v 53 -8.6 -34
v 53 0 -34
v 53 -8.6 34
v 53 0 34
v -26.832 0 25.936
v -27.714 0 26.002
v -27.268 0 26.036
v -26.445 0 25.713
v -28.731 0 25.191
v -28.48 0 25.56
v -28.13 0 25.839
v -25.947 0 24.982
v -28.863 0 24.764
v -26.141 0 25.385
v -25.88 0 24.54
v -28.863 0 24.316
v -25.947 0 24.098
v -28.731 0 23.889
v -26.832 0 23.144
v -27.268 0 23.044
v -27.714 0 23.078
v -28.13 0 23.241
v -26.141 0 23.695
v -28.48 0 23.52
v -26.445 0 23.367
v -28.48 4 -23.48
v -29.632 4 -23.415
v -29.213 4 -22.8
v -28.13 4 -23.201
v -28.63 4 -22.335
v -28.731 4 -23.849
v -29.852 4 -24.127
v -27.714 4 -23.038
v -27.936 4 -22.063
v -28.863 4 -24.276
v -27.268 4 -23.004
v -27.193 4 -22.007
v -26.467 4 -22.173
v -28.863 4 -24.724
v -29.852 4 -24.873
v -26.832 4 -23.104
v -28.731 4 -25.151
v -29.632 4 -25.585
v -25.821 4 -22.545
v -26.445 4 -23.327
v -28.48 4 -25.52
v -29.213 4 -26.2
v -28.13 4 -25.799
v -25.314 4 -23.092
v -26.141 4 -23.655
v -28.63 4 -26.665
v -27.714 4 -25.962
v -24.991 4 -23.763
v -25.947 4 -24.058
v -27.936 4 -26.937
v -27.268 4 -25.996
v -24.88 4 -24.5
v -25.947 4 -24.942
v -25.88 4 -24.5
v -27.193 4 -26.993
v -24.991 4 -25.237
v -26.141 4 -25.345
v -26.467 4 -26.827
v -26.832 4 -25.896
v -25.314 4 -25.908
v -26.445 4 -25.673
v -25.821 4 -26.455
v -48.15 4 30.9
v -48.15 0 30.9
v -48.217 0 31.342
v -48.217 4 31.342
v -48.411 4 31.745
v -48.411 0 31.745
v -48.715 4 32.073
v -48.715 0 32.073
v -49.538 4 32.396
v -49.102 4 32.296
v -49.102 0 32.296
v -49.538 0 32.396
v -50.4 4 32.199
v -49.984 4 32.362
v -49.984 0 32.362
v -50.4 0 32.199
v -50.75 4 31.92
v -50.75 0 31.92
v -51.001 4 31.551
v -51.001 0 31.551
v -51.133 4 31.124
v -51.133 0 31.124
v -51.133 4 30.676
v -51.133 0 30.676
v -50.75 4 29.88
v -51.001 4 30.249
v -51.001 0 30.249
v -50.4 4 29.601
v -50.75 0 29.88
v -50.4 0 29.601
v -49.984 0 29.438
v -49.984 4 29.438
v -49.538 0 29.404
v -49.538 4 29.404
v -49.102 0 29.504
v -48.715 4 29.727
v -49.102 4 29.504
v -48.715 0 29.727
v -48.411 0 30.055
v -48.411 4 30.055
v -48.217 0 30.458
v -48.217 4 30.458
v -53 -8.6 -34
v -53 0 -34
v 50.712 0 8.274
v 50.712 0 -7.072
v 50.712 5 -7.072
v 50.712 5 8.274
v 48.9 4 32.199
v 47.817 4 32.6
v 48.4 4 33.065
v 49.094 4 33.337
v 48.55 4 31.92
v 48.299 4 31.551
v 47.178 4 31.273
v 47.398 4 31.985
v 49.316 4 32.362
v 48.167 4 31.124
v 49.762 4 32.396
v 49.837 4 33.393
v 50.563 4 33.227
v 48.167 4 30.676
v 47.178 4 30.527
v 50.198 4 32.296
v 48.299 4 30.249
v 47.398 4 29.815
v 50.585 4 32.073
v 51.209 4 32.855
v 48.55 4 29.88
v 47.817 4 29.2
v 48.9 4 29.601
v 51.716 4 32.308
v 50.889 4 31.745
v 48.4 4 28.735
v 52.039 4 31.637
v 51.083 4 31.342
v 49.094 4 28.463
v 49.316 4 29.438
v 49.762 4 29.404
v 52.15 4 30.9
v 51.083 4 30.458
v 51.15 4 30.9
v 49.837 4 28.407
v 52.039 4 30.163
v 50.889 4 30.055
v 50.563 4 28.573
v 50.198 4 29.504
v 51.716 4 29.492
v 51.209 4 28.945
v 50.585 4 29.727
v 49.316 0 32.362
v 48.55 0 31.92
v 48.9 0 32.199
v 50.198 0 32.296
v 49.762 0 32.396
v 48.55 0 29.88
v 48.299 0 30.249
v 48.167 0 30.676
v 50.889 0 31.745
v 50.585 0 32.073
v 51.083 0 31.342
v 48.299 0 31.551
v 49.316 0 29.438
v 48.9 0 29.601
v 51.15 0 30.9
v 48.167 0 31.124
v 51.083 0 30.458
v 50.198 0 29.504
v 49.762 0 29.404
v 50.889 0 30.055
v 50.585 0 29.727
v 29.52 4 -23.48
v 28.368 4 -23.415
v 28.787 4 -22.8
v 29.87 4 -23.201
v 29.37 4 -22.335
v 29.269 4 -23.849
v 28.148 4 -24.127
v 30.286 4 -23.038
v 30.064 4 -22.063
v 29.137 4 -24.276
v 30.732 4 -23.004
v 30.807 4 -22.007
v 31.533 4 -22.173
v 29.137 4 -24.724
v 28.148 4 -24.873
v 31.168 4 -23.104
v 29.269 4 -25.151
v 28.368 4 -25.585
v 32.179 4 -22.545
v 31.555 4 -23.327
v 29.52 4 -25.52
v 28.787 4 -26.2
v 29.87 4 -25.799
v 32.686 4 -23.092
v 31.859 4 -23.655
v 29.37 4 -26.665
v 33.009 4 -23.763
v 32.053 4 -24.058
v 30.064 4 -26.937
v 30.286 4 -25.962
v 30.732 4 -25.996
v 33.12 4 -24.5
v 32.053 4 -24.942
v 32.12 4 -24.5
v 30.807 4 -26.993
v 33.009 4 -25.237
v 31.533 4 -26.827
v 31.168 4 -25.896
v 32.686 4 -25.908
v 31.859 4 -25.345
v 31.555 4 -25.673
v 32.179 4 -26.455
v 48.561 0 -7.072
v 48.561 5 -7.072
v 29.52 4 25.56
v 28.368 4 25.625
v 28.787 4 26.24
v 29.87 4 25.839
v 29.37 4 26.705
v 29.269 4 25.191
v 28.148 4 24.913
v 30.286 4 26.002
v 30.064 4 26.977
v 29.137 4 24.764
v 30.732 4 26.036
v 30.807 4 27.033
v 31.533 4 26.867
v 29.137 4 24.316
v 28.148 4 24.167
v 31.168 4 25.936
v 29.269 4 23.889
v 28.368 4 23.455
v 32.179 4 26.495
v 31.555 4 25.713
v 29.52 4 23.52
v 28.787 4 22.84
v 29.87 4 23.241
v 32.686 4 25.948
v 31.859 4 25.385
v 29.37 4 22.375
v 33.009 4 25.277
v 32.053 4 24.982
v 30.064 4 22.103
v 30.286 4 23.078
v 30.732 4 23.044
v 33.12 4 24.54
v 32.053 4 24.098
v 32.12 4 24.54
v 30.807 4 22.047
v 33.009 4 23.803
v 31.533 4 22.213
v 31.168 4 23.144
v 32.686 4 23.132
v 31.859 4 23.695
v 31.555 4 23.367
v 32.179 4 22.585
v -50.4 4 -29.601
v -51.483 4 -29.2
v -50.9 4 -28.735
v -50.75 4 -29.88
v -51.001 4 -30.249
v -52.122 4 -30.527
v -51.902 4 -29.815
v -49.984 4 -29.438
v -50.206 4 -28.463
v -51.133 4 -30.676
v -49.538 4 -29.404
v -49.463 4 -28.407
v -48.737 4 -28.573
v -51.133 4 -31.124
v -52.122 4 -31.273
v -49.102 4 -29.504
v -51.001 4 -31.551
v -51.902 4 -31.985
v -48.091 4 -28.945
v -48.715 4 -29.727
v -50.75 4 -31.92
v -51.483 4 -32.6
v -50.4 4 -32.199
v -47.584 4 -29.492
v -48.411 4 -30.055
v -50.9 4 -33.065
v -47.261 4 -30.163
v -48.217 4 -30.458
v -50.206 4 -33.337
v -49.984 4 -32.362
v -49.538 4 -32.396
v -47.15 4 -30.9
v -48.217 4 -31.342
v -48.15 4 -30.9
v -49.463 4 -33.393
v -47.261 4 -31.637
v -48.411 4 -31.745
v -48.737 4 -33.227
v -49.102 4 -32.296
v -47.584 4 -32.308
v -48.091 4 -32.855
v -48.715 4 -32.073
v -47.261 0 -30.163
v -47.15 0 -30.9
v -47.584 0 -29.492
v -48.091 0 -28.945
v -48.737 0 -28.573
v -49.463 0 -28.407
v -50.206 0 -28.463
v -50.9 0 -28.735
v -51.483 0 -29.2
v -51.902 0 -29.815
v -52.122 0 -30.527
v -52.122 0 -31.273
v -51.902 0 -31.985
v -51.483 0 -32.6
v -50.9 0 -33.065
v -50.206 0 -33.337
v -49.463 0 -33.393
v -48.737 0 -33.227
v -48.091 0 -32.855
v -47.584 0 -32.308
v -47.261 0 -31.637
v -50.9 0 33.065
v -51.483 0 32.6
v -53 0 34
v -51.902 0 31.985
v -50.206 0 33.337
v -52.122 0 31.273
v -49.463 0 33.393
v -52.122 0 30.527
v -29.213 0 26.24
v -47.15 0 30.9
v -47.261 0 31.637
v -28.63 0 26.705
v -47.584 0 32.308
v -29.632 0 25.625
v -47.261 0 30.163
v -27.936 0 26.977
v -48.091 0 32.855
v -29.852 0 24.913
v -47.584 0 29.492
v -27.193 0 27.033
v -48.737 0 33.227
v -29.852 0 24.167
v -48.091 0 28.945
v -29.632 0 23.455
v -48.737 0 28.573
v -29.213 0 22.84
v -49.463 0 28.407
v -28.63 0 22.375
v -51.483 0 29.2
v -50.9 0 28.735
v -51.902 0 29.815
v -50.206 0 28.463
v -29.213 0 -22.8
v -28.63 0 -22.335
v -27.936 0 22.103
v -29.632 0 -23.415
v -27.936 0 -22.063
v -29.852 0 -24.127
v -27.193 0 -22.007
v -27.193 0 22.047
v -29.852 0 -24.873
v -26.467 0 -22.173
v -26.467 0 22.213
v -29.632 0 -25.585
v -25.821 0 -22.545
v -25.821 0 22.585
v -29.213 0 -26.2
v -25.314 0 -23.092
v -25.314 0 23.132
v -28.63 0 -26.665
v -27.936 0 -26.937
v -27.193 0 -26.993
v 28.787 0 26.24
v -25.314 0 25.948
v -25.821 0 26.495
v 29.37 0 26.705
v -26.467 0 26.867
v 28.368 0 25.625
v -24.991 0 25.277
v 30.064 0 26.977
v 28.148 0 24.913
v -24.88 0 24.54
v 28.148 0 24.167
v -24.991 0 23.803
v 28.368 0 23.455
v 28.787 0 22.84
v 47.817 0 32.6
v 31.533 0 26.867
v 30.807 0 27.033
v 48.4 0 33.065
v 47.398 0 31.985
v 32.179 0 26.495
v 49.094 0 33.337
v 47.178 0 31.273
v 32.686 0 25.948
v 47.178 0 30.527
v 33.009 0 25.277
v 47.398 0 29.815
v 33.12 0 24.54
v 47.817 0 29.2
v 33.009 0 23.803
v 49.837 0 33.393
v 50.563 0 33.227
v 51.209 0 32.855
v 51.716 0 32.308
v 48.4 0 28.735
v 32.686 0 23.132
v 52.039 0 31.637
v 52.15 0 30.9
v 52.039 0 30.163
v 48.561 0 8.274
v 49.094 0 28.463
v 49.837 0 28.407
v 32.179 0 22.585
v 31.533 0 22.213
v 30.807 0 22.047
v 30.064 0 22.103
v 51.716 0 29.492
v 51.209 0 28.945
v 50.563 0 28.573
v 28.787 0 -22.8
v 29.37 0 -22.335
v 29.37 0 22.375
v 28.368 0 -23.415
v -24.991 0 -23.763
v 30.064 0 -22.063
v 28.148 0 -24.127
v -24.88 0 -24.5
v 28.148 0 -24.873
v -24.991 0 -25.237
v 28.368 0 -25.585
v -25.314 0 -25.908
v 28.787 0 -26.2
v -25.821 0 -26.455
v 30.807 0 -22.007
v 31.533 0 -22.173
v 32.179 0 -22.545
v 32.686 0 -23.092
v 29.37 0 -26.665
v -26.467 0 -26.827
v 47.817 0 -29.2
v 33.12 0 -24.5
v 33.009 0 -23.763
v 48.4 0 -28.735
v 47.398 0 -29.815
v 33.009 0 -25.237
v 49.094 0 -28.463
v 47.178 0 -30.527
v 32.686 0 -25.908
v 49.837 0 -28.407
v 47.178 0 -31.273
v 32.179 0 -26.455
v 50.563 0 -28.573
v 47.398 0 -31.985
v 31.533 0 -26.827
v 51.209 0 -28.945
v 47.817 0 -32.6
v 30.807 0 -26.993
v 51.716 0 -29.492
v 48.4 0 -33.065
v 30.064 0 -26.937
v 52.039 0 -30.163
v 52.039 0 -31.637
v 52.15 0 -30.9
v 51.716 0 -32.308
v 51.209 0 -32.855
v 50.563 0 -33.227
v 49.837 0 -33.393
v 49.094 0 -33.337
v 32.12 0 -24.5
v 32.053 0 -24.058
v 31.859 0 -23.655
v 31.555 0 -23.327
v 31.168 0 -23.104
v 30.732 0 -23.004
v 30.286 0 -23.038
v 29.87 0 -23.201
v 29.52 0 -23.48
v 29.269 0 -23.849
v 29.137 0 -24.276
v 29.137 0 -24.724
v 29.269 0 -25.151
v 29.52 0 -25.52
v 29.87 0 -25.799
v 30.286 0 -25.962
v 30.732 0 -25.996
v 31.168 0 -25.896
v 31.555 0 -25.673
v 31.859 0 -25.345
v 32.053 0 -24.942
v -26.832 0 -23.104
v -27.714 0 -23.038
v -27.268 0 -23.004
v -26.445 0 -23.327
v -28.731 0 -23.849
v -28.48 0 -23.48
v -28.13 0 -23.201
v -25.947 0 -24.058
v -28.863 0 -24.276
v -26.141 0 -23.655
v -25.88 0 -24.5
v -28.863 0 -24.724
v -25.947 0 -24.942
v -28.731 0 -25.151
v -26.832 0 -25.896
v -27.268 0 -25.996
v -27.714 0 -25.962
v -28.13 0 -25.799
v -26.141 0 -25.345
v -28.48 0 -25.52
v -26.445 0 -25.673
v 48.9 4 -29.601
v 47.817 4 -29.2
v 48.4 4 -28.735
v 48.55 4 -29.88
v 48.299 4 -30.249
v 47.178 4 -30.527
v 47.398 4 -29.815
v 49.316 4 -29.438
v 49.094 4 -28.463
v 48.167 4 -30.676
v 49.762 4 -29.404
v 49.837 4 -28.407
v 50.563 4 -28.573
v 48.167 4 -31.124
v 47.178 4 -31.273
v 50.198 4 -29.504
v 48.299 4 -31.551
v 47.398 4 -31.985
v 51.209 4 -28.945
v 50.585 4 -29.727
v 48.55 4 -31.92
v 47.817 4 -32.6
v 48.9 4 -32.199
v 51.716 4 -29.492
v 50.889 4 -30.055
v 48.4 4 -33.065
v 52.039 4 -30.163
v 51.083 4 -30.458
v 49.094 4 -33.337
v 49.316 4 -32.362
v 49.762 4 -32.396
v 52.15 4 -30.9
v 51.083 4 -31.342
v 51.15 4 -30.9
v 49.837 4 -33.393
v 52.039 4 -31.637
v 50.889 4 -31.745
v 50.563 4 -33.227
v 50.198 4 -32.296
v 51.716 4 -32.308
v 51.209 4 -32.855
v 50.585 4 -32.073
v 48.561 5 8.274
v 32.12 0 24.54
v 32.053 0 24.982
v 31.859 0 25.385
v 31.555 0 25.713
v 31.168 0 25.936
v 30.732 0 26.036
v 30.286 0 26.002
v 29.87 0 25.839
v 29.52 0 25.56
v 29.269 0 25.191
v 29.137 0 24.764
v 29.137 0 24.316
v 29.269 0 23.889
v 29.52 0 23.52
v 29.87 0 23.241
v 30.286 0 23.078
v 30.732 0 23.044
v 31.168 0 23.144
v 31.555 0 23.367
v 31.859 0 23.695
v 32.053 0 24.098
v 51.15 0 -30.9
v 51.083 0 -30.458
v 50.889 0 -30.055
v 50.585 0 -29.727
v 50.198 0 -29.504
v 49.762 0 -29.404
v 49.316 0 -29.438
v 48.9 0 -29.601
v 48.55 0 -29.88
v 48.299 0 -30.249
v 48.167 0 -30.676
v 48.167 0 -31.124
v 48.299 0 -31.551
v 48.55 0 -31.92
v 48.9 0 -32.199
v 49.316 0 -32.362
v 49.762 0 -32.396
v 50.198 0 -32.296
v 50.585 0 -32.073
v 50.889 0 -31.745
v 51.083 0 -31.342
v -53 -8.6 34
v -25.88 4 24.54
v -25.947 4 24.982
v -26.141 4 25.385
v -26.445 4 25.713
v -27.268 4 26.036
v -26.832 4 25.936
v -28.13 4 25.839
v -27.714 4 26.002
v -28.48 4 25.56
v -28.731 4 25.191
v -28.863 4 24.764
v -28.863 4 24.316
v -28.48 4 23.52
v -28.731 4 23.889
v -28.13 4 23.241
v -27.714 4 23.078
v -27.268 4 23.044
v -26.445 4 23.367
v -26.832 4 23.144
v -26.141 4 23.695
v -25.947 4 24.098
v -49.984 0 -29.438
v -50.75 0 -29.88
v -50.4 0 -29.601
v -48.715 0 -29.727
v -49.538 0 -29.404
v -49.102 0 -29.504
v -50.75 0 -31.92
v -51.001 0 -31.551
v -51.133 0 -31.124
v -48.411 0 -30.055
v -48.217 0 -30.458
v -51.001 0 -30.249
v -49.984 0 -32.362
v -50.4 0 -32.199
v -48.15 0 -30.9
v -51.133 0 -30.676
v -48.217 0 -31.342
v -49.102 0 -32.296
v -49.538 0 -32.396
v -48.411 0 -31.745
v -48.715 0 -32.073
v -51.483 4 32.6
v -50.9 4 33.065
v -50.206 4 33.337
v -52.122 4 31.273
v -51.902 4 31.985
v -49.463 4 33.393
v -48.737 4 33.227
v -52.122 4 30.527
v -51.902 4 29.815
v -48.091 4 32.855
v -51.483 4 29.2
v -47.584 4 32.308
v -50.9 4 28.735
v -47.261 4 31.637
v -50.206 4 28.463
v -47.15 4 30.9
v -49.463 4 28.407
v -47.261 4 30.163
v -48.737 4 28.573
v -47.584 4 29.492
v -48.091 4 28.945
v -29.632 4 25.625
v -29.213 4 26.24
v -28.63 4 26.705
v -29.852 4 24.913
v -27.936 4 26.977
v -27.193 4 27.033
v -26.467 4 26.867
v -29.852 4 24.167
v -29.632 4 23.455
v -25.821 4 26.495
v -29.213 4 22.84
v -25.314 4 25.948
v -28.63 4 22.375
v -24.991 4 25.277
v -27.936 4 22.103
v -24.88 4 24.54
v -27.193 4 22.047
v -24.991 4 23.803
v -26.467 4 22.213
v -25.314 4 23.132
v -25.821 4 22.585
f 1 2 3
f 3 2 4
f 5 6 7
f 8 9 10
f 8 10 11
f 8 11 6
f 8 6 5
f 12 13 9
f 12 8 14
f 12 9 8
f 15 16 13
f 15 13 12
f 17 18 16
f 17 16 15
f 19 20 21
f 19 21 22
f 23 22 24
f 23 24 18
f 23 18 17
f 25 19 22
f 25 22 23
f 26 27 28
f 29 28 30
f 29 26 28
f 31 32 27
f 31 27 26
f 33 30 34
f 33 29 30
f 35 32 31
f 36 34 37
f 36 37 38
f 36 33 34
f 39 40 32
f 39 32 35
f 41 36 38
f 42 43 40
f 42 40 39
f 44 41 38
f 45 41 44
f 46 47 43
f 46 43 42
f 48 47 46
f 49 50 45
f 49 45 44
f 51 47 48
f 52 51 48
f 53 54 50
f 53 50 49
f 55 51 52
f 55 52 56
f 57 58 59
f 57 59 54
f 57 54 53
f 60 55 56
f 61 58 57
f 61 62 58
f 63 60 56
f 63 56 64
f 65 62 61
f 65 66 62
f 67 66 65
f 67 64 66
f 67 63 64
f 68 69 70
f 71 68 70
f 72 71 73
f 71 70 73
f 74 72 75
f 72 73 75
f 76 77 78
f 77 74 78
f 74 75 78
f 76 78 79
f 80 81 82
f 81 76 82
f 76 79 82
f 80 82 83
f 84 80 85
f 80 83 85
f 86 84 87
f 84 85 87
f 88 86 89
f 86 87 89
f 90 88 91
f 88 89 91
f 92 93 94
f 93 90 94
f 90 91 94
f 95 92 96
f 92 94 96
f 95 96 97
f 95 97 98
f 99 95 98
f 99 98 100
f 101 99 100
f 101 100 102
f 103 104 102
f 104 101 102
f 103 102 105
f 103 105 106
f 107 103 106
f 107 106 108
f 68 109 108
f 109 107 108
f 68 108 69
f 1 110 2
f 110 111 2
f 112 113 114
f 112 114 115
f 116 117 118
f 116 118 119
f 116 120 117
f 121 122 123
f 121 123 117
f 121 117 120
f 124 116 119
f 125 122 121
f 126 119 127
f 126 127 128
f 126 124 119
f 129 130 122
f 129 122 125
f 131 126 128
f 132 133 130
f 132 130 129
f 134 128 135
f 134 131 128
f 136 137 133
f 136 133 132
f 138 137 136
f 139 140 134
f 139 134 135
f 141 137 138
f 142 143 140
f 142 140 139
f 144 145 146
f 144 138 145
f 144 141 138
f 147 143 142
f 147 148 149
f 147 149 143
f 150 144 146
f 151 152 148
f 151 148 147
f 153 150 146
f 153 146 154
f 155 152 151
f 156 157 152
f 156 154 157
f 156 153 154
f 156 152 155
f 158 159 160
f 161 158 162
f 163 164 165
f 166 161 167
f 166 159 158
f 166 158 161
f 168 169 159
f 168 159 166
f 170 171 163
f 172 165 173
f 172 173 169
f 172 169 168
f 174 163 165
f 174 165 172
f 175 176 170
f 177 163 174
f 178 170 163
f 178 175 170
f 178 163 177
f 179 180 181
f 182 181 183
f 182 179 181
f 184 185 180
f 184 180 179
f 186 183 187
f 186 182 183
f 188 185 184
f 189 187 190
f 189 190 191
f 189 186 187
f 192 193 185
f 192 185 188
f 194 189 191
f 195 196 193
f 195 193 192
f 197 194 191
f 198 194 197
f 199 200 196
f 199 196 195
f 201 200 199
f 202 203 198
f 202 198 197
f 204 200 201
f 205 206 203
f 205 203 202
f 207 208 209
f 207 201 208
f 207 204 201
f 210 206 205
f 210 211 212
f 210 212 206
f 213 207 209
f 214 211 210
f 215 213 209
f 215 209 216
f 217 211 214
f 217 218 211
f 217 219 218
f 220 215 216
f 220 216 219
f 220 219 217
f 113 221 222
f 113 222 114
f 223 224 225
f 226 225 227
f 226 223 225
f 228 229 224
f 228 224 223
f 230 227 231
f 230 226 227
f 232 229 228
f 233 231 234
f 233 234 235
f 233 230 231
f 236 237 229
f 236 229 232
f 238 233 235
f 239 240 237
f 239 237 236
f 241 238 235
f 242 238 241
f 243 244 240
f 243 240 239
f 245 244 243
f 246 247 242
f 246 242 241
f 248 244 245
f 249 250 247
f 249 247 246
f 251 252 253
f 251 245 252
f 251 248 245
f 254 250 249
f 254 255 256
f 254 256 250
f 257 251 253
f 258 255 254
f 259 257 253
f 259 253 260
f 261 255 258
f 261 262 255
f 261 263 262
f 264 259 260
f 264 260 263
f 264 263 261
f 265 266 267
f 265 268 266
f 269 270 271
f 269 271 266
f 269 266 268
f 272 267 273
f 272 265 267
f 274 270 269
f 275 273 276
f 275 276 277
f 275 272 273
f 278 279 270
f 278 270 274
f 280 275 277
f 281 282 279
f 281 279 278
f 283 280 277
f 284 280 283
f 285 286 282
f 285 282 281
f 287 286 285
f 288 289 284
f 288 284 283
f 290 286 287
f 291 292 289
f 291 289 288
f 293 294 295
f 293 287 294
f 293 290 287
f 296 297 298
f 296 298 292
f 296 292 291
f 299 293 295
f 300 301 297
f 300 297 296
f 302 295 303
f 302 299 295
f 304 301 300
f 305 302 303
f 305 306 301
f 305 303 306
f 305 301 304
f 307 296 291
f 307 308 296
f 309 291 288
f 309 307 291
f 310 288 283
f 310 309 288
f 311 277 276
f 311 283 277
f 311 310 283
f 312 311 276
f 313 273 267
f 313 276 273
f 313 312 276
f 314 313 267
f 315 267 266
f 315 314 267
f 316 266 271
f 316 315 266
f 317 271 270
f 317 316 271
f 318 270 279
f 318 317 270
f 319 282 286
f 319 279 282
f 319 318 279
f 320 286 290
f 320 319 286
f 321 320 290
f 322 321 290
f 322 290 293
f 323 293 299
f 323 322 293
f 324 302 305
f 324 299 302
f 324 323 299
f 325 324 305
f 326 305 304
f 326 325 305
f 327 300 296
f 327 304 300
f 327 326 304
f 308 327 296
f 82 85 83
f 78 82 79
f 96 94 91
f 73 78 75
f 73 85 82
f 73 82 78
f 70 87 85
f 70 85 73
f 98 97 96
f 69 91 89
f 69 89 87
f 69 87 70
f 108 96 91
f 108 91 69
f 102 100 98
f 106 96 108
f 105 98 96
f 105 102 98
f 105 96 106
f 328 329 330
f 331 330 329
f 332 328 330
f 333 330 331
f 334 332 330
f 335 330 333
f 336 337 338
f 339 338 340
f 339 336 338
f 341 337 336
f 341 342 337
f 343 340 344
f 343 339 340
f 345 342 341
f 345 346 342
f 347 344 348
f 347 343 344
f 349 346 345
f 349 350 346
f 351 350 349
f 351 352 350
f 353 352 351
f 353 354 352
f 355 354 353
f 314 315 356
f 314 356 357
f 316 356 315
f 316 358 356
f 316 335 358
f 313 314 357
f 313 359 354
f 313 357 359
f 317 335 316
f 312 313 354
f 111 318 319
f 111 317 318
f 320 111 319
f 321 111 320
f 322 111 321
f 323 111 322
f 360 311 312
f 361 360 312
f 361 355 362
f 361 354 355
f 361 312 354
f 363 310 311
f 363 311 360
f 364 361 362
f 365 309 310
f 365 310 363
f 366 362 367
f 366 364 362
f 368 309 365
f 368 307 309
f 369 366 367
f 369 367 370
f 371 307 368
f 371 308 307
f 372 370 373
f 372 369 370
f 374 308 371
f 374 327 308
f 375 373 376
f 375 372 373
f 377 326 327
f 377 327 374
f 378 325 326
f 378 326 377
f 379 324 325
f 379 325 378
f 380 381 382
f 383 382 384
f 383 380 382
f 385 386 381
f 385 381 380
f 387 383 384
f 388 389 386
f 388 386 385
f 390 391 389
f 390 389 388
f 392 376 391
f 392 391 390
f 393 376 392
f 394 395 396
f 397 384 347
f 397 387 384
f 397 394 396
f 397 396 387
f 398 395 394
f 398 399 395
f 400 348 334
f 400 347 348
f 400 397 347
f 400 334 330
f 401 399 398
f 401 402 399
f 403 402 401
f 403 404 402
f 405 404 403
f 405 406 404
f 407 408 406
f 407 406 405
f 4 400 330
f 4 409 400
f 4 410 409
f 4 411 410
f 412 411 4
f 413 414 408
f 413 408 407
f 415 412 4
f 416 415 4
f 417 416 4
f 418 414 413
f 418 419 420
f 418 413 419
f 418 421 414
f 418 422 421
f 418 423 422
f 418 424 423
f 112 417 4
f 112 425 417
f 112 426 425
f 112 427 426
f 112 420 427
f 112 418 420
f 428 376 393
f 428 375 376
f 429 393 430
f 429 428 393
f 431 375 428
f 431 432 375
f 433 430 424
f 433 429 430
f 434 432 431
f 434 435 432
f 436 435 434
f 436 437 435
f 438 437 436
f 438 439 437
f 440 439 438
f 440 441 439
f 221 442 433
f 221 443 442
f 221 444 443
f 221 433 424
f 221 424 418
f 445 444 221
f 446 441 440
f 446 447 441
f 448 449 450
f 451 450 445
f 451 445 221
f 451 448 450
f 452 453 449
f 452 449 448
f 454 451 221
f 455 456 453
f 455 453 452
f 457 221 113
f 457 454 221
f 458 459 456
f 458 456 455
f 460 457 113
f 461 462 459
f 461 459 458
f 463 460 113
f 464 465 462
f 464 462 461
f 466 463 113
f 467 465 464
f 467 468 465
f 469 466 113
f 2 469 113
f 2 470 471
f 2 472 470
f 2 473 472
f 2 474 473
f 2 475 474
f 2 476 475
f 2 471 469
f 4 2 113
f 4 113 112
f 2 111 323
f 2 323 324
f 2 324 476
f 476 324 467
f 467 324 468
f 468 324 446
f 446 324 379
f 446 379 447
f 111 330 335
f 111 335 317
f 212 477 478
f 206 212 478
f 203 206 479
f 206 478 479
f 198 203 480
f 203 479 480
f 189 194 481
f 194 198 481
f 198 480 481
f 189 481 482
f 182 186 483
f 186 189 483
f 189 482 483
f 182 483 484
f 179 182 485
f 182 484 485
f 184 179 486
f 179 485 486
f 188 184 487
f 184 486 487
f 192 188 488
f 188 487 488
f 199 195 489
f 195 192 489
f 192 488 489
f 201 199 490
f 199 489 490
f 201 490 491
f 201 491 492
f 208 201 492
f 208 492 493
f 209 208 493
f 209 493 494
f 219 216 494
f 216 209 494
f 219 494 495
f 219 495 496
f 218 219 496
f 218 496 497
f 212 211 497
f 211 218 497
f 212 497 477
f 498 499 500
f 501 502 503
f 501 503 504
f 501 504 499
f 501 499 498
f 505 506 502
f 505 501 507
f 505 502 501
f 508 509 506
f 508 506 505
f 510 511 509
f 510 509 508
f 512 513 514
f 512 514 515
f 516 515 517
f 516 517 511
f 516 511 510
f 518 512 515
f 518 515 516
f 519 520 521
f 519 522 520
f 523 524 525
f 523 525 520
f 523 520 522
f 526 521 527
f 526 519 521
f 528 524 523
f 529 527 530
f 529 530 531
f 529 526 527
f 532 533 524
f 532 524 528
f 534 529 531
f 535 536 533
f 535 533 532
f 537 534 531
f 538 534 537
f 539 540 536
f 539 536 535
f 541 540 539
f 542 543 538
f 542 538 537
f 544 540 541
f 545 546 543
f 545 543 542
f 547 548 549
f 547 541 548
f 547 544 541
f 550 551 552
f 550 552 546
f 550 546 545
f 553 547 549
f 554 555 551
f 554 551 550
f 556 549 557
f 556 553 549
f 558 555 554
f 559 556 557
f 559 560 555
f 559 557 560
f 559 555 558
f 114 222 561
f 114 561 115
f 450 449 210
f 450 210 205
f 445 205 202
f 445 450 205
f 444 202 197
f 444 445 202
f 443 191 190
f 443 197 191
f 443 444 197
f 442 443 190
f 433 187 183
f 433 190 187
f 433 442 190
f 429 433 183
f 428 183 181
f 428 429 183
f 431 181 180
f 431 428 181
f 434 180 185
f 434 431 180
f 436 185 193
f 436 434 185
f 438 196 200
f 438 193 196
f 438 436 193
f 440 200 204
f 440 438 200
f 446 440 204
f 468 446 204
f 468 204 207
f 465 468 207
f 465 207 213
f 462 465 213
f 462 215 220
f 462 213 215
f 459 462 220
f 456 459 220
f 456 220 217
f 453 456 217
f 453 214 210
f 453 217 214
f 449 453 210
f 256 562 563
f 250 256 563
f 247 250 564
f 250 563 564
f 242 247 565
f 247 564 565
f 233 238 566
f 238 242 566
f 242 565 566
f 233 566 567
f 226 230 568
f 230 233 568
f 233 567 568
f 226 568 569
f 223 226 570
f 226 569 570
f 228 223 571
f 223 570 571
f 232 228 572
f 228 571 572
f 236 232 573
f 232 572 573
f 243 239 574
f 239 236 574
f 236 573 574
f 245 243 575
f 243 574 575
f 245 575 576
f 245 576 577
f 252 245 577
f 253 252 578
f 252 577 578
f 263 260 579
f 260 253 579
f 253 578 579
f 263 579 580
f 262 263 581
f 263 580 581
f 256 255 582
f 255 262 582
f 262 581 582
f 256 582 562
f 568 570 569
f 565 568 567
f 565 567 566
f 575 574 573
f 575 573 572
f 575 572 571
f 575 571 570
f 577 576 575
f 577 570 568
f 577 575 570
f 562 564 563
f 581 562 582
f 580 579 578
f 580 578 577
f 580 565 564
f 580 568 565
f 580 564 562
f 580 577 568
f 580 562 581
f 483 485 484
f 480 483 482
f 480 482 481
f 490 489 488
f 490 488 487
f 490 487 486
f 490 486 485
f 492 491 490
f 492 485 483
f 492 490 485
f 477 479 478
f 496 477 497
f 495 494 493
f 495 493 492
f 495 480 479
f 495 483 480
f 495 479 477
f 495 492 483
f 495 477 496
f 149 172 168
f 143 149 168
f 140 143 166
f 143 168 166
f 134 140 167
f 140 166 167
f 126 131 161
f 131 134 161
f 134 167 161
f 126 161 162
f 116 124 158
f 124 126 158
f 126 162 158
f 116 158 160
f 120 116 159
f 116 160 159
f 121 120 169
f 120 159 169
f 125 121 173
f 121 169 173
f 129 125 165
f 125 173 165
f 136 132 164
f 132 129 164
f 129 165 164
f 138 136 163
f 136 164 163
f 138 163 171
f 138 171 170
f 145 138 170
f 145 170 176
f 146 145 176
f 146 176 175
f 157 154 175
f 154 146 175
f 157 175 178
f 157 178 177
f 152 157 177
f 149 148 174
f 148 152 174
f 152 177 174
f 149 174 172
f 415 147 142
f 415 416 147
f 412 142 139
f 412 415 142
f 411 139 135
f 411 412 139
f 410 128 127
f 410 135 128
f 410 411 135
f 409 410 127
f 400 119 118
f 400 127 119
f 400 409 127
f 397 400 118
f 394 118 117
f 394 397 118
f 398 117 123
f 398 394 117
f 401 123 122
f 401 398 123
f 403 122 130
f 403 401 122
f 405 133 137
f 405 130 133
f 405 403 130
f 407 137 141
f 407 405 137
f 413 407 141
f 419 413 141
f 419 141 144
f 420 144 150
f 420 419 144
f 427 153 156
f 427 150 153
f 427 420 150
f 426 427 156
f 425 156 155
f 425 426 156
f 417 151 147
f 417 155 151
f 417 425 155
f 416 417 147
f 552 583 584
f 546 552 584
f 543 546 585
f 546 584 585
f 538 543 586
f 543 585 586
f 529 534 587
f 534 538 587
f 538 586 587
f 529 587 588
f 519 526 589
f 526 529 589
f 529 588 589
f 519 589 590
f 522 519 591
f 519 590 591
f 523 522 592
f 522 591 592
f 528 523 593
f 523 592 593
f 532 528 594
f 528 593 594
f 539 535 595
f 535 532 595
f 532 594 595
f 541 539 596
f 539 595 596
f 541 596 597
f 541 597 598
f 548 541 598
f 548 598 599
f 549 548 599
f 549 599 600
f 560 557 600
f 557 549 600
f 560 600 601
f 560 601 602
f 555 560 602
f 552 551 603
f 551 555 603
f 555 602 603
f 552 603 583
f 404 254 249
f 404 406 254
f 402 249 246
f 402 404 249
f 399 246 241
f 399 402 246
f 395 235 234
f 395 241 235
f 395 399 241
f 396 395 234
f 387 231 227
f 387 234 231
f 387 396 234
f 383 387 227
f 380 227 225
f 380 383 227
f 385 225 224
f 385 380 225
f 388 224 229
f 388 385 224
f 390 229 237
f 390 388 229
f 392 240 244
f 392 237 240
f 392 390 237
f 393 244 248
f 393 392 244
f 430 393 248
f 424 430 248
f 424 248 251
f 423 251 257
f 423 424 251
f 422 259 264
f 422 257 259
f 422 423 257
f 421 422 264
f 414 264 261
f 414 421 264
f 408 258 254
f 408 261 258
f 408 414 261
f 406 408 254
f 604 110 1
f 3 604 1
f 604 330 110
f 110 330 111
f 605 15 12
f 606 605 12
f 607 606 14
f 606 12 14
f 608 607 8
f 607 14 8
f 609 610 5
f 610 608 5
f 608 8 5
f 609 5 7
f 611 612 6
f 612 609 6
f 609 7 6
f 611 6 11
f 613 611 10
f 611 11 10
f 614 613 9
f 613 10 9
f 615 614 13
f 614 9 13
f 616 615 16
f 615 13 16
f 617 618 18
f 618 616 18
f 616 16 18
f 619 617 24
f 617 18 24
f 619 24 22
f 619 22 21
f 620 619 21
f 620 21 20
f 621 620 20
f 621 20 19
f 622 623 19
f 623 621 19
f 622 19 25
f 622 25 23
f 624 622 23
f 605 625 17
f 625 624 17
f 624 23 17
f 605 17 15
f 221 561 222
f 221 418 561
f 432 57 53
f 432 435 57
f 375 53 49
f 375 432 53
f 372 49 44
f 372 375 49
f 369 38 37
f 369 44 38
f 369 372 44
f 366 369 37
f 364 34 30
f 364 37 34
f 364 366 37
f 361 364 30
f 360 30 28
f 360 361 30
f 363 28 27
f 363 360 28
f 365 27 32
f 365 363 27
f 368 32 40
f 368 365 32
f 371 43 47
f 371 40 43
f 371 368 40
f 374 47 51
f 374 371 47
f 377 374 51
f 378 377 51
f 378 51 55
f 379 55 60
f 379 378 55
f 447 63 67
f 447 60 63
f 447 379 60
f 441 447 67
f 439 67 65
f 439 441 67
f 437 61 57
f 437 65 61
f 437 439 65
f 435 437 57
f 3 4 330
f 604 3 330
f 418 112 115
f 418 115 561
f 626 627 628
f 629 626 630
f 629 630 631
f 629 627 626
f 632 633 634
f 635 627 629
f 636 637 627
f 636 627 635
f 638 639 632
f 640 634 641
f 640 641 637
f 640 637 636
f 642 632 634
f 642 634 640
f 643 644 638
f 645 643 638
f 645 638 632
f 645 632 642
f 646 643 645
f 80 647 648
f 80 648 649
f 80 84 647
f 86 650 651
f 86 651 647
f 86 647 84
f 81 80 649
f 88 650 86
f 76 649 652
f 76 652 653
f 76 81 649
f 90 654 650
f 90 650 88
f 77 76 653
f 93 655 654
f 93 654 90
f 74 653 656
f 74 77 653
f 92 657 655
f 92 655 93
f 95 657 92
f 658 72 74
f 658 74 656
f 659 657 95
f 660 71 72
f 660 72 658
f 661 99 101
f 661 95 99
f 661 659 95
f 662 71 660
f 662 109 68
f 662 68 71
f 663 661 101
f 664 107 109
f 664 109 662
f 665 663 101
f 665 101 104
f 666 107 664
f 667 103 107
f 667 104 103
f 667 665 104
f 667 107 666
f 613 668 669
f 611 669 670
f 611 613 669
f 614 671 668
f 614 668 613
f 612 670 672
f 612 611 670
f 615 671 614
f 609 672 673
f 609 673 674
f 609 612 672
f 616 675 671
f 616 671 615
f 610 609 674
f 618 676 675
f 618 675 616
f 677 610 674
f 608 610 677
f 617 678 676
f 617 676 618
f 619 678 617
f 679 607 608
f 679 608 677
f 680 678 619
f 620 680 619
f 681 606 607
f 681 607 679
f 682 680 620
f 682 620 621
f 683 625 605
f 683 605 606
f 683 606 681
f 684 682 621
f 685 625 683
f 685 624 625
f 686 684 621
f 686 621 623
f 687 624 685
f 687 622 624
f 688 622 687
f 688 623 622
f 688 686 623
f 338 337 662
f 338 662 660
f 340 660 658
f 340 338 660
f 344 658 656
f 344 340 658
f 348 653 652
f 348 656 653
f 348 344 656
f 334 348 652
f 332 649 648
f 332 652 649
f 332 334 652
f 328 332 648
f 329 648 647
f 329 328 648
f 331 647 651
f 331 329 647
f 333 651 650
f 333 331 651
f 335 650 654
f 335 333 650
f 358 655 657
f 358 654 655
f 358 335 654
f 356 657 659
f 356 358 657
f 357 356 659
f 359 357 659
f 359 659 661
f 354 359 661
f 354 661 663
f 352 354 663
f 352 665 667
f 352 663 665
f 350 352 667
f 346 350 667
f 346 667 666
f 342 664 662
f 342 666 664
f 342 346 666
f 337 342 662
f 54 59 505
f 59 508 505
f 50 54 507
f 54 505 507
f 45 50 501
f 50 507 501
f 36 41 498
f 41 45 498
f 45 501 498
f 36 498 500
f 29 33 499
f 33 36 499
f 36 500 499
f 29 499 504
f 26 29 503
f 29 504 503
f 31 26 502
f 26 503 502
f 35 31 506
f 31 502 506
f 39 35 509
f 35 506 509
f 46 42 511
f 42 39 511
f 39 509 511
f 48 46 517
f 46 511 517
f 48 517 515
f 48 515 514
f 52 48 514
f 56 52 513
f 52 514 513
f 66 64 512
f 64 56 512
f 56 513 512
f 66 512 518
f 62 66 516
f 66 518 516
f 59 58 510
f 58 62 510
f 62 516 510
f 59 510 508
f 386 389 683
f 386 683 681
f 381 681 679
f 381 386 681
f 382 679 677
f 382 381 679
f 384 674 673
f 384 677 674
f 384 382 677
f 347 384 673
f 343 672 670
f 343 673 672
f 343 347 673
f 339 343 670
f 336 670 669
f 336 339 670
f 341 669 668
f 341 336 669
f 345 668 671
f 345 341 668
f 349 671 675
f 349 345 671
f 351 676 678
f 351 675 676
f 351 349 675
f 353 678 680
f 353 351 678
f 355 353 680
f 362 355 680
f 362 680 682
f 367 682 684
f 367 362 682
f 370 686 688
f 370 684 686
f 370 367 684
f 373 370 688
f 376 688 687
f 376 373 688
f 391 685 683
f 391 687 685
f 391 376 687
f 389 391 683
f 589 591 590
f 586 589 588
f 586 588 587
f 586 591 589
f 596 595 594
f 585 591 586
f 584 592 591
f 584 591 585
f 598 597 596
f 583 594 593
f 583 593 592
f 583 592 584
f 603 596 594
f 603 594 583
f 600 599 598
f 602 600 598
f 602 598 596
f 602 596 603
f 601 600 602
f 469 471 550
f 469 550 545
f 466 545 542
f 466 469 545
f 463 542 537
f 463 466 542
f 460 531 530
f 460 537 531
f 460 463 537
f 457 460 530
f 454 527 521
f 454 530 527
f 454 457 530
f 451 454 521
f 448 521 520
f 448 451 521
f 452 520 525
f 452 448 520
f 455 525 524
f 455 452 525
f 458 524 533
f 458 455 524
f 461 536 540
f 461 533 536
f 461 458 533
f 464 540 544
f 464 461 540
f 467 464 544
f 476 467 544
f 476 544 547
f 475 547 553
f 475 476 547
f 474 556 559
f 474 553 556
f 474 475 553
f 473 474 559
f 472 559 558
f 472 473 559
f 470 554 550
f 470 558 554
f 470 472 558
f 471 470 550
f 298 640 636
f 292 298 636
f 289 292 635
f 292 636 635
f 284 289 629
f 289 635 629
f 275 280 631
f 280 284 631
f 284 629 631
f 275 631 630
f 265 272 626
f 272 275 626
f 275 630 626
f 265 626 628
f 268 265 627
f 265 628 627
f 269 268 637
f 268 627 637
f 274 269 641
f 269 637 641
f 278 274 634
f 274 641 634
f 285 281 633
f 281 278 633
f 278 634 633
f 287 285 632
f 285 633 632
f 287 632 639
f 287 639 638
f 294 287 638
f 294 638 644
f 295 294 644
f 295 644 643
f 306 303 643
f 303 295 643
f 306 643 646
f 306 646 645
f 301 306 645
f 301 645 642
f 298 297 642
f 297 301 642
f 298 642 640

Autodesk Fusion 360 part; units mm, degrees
sketch "lcd" plane through (0, 0, 0) normal (0, 1, 0) x (1, 0, 0)
  line L0 (53, -34) -> (-53, -34)
  line L1 (-53, -34) -> (-53, 34)
  line L2 (-53, 34) -> (53, 34)
  line L3 (53, 34) -> (53, -34)
  line L4 (53, -34) -> (-53, 34) construction
  line L5 (-53, -34) -> (53, 34) construction
  line L6 (49.65, -30.9) -> (-49.65, -30.9) construction
  line L7 (-49.65, -30.9) -> (-49.65, 30.9) construction
  line L8 (-49.65, 30.9) -> (49.65, 30.9) construction
  line L9 (49.65, 30.9) -> (49.65, -30.9) construction
  line L10 (49.65, -30.9) -> (-49.65, 30.9) construction
  line L11 (-49.65, -30.9) -> (49.65, 30.9) construction
  circle A0 centre (-49.65, 30.9) radius 1.5
  circle A1 centre (-49.65, 30.9) radius 2.5
  circle A2 centre (-49.65, -30.9) radius 2.5
  circle A3 centre (-49.65, -30.9) radius 1.5
  circle A4 centre (49.65, -30.9) radius 2.5
  circle A5 centre (49.65, -30.9) radius 1.5
  circle A6 centre (49.65, 30.9) radius 2.5
  circle A7 centre (49.65, 30.9) radius 1.5
  circle A8 centre (-27.38, -24.54) radius 2.5
  circle A9 centre (-27.38, -24.54) radius 1.5
  circle A10 centre (30.62, -24.54) radius 1.5
  circle A11 centre (30.62, -24.54) radius 2.5
  circle A12 centre (-27.38, 24.5) radius 1.5
  circle A13 centre (-27.38, 24.5) radius 2.5
  circle A14 centre (30.62, 24.5) radius 2.5
  circle A15 centre (30.62, 24.5) radius 1.5
  line L12 (48.5612, 7.0715) -> (50.7124, 7.0715)
  line L13 (50.7124, 7.0715) -> (50.7124, -8.2737)
  line L14 (50.7124, -8.2737) -> (48.5612, -8.2737)
  line L15 (48.5612, -8.2737) -> (48.5612, 7.0715)
  dimension "d1" = 106
  dimension "d2" = 68
  dimension "d3" = 99.3
  dimension "d4" = 61.8
  dimension "d5" = 3
  dimension "d6" = 5
  dimension "d7" = 3
  dimension "d8" = 5
  dimension "d9" = 3
  dimension "d10" = 5
  dimension "d11" = 3
  dimension "d12" = 5
  dimension "d13" = 3
  dimension "d14" = 5
  dimension "d15" = 9.46
  dimension "d16" = 25.62
  dimension "d17" = 3
  dimension "d18" = 5
  dimension "d19" = 22.38
  dimension "d20" = 3
  dimension "d21" = 5
  dimension "d22" = 3
  dimension "d23" = 5
  dimension "d24" = 9.5
  dimension "d25" = 9.5
extrude "Extrude1" add sketch "lcd" against normal blind 8.6 contours L0 L1 L2 L3 | A0 | A1 | A2 | A3 | A4 | A5 | A6 | A7 | A8 | A9 | A10 | A11 | A12 | A13 | A14 | A15 | L12 L13 L14 L15
extrude "Extrude2" add sketch "lcd" along normal blind 4 contours A1 | A2 | A4 | A6 | A8 | A11 | A13 | A14
extrude "Extrude3" add sketch "lcd" along normal blind 5 contours L12 L13 L14 L15
